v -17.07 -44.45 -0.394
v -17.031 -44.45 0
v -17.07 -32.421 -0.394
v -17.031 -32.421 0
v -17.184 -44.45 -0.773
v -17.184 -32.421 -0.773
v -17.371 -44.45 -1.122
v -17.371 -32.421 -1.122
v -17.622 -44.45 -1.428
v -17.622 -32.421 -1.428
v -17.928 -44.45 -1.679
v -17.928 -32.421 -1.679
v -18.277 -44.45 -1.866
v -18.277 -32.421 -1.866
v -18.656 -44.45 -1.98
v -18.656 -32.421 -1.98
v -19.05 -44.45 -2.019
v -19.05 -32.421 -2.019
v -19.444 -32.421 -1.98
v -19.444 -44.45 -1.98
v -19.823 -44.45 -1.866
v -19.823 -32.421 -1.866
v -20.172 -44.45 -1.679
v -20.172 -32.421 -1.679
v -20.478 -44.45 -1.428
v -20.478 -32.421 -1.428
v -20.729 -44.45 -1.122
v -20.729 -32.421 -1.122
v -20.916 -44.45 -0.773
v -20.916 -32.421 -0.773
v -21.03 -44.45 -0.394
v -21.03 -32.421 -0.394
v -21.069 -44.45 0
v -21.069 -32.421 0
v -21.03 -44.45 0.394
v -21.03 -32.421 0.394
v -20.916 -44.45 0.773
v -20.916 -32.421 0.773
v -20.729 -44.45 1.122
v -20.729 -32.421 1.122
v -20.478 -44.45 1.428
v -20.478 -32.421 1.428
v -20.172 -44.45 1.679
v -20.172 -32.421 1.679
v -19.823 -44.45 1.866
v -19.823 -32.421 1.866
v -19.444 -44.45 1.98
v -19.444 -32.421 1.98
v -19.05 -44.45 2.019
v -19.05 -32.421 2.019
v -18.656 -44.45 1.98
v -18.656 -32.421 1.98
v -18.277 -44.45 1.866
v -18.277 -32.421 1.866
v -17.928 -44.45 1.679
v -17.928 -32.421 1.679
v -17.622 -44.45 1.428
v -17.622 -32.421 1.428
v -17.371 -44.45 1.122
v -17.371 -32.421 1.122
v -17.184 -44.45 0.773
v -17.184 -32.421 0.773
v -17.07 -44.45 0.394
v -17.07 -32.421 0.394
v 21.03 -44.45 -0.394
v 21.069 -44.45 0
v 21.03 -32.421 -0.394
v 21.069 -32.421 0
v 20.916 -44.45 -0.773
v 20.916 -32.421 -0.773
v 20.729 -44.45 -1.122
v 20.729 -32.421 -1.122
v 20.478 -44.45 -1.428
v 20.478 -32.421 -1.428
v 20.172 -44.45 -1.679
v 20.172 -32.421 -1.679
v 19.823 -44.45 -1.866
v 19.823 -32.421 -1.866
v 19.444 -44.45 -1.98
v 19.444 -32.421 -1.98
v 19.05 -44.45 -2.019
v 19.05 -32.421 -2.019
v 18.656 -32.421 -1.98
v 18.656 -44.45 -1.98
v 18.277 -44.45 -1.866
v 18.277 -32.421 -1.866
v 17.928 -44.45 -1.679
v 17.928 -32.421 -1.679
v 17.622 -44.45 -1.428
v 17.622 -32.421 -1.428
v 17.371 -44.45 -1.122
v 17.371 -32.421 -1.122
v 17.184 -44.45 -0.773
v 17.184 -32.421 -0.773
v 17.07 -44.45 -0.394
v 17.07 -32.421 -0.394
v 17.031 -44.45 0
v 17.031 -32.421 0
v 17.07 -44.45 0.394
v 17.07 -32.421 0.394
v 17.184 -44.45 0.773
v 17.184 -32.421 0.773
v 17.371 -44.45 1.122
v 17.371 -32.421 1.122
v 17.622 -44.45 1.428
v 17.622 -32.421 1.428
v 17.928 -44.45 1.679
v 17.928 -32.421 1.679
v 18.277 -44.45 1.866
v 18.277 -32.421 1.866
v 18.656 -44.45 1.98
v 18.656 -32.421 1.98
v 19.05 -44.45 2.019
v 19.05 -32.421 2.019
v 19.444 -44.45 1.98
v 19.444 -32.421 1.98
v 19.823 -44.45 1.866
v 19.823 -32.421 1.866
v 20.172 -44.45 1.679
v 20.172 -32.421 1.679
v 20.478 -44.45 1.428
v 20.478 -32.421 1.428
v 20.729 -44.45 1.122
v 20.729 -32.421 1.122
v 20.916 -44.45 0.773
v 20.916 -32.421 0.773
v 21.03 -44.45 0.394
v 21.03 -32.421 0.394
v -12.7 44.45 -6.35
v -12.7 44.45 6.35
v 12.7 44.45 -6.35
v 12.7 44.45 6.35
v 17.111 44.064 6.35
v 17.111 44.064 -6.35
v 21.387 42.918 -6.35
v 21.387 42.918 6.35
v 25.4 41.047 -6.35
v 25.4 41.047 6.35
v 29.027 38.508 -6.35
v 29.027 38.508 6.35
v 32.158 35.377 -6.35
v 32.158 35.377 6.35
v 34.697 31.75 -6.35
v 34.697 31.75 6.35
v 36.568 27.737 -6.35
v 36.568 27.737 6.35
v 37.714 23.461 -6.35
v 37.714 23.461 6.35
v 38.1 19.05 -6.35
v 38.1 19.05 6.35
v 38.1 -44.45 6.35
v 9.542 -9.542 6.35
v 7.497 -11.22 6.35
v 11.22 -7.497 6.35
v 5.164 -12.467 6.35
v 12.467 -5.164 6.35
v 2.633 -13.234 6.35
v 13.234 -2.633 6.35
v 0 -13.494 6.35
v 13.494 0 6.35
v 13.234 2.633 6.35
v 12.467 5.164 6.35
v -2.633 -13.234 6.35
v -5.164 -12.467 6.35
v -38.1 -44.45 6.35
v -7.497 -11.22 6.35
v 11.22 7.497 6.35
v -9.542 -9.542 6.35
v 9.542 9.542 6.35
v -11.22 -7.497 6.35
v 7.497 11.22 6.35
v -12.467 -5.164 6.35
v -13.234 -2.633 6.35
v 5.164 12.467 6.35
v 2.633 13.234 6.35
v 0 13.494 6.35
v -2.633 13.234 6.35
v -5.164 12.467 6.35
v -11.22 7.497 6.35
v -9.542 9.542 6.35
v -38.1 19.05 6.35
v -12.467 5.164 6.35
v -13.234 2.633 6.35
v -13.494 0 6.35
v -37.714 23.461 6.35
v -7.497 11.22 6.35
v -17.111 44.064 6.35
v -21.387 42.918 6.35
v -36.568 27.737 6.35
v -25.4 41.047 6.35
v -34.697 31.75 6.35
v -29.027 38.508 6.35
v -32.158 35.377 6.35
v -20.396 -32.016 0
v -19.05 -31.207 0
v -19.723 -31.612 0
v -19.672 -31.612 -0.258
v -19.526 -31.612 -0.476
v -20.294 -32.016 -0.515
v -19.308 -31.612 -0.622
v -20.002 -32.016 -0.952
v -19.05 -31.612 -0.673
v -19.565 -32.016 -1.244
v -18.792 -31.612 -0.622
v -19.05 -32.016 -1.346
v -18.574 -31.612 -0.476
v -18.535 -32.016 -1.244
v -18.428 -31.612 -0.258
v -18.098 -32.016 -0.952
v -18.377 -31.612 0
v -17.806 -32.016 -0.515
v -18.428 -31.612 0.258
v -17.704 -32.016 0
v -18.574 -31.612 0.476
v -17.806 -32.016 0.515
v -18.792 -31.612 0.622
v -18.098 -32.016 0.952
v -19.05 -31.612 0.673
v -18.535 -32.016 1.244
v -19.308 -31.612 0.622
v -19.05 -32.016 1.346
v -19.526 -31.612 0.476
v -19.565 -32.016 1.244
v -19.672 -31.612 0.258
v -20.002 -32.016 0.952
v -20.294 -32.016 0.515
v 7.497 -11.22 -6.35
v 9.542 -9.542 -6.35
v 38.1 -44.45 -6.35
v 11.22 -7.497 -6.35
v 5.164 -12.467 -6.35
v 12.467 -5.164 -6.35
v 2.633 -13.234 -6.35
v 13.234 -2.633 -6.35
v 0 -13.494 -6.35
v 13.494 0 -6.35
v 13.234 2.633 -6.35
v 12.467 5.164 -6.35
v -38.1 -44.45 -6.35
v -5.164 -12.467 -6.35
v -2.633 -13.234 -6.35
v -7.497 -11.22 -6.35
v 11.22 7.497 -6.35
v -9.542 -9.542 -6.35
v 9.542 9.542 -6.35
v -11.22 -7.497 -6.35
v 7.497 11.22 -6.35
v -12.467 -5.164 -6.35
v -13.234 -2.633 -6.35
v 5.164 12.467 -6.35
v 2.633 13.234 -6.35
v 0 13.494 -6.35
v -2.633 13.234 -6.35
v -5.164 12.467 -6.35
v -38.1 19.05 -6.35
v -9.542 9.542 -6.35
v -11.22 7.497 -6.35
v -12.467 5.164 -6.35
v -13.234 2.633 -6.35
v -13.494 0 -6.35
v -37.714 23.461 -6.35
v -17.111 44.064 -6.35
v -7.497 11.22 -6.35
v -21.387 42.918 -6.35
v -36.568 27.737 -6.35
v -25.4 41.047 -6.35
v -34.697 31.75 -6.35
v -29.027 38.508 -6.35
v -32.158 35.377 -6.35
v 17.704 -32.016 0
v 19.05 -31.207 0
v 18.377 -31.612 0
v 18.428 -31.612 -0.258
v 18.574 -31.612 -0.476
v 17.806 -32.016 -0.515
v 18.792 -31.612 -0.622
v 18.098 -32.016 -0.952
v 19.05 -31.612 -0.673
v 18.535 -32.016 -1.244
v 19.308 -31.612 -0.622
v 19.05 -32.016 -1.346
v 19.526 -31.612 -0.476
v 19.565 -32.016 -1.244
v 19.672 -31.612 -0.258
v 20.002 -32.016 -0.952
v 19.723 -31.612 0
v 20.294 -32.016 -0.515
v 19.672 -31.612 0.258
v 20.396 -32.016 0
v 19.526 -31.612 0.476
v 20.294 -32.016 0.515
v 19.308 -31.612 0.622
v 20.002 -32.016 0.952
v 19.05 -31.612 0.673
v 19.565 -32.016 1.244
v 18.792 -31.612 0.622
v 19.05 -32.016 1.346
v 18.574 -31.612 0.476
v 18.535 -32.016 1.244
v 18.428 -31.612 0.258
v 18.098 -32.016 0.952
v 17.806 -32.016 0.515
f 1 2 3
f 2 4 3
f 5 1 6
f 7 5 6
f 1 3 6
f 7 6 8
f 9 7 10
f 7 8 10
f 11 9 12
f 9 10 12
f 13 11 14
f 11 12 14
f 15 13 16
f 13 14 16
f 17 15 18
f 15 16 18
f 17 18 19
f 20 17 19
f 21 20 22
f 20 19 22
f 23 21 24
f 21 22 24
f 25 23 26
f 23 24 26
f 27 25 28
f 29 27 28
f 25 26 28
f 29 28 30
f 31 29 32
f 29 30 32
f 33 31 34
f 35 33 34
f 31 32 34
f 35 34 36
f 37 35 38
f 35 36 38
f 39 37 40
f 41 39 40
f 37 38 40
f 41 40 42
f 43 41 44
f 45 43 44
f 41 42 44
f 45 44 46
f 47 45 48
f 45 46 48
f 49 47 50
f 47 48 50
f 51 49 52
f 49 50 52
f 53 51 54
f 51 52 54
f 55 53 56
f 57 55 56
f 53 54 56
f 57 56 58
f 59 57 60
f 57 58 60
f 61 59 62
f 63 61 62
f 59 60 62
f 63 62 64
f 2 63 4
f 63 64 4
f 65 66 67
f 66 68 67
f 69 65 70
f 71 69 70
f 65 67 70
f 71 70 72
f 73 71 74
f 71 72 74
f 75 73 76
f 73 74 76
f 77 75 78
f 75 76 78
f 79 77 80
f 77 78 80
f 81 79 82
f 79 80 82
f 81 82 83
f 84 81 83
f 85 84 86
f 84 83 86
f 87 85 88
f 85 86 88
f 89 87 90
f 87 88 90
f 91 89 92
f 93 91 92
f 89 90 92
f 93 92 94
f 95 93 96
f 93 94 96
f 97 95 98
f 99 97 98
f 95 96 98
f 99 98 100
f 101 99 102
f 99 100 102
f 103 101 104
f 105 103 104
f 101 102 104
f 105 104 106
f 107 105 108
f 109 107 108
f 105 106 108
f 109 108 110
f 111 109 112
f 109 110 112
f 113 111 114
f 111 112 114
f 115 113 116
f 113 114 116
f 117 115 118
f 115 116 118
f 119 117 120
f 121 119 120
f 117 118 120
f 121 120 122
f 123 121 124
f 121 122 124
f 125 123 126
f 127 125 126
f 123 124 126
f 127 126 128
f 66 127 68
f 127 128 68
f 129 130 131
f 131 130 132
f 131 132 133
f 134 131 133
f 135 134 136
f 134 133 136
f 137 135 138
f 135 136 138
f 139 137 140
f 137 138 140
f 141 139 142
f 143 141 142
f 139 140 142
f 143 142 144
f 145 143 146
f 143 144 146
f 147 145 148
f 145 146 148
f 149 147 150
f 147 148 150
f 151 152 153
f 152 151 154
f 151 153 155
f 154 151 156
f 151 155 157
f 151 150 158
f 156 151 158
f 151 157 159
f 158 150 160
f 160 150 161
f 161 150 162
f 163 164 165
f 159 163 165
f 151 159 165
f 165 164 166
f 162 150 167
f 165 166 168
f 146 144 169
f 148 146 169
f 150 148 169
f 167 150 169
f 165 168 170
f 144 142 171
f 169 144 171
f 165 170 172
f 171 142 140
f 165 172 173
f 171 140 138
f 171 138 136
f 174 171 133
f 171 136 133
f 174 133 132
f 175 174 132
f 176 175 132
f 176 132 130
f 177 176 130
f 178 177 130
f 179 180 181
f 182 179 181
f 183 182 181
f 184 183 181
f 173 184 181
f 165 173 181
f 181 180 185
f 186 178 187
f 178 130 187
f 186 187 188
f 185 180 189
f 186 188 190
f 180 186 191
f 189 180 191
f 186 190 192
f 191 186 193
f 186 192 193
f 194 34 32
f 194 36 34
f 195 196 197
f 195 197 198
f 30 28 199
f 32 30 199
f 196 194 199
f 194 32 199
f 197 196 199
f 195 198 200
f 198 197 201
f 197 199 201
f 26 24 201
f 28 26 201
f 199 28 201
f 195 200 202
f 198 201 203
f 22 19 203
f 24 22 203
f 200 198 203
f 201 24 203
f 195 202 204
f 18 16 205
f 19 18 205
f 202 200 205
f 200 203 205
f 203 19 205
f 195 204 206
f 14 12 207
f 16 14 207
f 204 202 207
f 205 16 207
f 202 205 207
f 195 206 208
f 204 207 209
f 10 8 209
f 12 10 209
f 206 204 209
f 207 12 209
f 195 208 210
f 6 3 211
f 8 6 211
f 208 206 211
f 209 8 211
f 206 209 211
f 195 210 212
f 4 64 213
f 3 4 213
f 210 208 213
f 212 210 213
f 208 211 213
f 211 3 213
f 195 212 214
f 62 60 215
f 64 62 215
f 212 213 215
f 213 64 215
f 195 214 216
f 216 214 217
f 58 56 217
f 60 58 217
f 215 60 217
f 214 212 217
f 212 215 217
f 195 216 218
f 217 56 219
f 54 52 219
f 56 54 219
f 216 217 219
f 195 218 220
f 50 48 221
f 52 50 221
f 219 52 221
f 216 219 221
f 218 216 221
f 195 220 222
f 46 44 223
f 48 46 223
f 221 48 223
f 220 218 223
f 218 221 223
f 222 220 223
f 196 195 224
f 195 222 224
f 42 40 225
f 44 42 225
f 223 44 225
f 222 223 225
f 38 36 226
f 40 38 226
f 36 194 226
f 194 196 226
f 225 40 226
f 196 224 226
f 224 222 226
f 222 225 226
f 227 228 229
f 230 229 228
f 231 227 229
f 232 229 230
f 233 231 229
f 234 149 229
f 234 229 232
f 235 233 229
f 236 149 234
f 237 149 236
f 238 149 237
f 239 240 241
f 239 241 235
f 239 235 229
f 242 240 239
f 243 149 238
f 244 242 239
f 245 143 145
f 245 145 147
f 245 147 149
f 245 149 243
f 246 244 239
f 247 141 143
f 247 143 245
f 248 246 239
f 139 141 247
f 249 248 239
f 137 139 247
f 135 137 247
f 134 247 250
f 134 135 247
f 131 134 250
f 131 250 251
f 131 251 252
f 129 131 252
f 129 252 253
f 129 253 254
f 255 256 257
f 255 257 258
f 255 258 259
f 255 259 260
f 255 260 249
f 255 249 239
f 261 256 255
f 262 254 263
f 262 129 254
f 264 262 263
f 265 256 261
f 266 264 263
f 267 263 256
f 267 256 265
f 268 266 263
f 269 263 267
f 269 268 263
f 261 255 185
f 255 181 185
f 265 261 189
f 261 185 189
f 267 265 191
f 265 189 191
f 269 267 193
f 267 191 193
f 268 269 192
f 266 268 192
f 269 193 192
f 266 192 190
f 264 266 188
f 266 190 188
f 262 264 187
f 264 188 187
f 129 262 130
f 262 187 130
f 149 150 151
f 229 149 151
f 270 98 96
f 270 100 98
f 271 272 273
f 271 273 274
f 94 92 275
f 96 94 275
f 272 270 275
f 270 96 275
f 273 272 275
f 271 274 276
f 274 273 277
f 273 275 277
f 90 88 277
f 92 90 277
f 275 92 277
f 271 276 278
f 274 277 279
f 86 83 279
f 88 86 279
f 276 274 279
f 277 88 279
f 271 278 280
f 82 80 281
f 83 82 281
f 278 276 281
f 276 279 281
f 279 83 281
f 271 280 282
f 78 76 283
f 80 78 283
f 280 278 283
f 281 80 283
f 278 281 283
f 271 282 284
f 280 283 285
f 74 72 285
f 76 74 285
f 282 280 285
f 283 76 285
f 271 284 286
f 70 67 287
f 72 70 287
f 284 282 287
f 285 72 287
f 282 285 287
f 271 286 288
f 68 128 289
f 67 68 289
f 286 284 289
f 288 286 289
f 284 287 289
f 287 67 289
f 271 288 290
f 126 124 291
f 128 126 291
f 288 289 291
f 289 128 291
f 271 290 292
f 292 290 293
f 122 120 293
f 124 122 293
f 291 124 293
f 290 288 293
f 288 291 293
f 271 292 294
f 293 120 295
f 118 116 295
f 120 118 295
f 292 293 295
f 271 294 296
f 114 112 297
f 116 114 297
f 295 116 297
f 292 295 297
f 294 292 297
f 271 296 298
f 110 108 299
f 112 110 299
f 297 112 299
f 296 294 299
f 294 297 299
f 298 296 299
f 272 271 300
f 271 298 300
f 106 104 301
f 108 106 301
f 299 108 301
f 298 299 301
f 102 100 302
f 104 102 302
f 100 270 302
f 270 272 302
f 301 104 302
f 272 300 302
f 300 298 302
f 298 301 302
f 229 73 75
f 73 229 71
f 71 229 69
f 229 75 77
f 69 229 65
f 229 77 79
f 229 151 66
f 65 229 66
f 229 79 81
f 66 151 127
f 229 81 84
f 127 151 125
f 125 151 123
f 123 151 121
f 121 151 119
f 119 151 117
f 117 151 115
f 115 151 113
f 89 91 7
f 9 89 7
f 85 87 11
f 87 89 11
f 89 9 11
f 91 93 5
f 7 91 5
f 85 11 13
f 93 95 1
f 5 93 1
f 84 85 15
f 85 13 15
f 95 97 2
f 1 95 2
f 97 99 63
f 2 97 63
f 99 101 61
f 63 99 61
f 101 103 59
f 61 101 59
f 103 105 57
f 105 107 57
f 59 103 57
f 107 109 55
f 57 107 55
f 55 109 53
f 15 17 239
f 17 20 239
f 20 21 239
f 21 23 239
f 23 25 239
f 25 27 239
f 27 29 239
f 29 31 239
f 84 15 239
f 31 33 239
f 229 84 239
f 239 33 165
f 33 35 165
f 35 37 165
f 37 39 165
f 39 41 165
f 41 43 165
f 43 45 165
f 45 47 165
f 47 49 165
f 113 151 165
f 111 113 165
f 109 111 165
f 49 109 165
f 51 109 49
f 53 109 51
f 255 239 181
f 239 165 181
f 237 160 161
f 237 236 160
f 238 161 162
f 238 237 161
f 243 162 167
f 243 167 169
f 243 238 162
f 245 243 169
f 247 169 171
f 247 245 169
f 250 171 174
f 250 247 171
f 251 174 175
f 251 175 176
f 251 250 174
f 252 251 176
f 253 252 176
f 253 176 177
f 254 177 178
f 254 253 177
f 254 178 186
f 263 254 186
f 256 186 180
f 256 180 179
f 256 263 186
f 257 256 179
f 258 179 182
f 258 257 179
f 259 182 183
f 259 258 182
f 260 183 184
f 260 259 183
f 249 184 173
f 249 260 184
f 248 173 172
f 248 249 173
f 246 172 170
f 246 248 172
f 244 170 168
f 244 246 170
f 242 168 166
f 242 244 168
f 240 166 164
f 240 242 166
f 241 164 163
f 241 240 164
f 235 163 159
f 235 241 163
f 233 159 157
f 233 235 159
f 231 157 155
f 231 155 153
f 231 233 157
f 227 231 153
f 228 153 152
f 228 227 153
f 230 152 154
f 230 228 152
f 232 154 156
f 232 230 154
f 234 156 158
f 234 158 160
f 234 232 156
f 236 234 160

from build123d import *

# Parameters (mm, degrees)
SKETCH1_R                  = 13.49375
BOSS_EXTRUDE1_DEPTH        = 6.35
F_10_32_TAPPED_HOLE1_D     = 4.0386
F_10_32_TAPPED_HOLE1_DEPTH = 12.02944
F_10_32_TAPPED_HOLE1_TIP   = 1.213317848


with BuildPart() as part:
    # Sketch1 → Boss-Extrude1 (new body, symmetric)
    with BuildSketch(Plane.XY):
        with BuildLine():
            Line((38.1, -44.45), (-38.1, -44.45))
            Line((-38.1, -44.45), (-38.1, 19.05))
            ThreePointArc((-38.1, 19.05), (-30.660512242, 37.010512242), (-12.7, 44.45))
            Line((-12.7, 44.45), (12.7, 44.45))
            ThreePointArc((12.7, 44.45), (30.660512242, 37.010512242), (38.1, 19.05))
            Line((38.1, 19.05), (38.1, -44.45))
        make_face()
        Circle(SKETCH1_R, mode=Mode.SUBTRACT)
    extrude(amount=BOSS_EXTRUDE1_DEPTH, both=True)

    # #10-32 Tapped Hole1
    with Locations(Plane(origin=(0, -44.45, 0), x_dir=(-1, 0, 0), z_dir=(0, -1, 0))):
        with Locations((19.05, 0), (-19.05, 0)):
            Hole(F_10_32_TAPPED_HOLE1_D / 2, depth=F_10_32_TAPPED_HOLE1_DEPTH)
            with Locations((0, 0, -(F_10_32_TAPPED_HOLE1_DEPTH + F_10_32_TAPPED_HOLE1_TIP / 2))):  # 118° drill point
                Cone(0, F_10_32_TAPPED_HOLE1_D / 2, F_10_32_TAPPED_HOLE1_TIP, mode=Mode.SUBTRACT)


solid = part.part
